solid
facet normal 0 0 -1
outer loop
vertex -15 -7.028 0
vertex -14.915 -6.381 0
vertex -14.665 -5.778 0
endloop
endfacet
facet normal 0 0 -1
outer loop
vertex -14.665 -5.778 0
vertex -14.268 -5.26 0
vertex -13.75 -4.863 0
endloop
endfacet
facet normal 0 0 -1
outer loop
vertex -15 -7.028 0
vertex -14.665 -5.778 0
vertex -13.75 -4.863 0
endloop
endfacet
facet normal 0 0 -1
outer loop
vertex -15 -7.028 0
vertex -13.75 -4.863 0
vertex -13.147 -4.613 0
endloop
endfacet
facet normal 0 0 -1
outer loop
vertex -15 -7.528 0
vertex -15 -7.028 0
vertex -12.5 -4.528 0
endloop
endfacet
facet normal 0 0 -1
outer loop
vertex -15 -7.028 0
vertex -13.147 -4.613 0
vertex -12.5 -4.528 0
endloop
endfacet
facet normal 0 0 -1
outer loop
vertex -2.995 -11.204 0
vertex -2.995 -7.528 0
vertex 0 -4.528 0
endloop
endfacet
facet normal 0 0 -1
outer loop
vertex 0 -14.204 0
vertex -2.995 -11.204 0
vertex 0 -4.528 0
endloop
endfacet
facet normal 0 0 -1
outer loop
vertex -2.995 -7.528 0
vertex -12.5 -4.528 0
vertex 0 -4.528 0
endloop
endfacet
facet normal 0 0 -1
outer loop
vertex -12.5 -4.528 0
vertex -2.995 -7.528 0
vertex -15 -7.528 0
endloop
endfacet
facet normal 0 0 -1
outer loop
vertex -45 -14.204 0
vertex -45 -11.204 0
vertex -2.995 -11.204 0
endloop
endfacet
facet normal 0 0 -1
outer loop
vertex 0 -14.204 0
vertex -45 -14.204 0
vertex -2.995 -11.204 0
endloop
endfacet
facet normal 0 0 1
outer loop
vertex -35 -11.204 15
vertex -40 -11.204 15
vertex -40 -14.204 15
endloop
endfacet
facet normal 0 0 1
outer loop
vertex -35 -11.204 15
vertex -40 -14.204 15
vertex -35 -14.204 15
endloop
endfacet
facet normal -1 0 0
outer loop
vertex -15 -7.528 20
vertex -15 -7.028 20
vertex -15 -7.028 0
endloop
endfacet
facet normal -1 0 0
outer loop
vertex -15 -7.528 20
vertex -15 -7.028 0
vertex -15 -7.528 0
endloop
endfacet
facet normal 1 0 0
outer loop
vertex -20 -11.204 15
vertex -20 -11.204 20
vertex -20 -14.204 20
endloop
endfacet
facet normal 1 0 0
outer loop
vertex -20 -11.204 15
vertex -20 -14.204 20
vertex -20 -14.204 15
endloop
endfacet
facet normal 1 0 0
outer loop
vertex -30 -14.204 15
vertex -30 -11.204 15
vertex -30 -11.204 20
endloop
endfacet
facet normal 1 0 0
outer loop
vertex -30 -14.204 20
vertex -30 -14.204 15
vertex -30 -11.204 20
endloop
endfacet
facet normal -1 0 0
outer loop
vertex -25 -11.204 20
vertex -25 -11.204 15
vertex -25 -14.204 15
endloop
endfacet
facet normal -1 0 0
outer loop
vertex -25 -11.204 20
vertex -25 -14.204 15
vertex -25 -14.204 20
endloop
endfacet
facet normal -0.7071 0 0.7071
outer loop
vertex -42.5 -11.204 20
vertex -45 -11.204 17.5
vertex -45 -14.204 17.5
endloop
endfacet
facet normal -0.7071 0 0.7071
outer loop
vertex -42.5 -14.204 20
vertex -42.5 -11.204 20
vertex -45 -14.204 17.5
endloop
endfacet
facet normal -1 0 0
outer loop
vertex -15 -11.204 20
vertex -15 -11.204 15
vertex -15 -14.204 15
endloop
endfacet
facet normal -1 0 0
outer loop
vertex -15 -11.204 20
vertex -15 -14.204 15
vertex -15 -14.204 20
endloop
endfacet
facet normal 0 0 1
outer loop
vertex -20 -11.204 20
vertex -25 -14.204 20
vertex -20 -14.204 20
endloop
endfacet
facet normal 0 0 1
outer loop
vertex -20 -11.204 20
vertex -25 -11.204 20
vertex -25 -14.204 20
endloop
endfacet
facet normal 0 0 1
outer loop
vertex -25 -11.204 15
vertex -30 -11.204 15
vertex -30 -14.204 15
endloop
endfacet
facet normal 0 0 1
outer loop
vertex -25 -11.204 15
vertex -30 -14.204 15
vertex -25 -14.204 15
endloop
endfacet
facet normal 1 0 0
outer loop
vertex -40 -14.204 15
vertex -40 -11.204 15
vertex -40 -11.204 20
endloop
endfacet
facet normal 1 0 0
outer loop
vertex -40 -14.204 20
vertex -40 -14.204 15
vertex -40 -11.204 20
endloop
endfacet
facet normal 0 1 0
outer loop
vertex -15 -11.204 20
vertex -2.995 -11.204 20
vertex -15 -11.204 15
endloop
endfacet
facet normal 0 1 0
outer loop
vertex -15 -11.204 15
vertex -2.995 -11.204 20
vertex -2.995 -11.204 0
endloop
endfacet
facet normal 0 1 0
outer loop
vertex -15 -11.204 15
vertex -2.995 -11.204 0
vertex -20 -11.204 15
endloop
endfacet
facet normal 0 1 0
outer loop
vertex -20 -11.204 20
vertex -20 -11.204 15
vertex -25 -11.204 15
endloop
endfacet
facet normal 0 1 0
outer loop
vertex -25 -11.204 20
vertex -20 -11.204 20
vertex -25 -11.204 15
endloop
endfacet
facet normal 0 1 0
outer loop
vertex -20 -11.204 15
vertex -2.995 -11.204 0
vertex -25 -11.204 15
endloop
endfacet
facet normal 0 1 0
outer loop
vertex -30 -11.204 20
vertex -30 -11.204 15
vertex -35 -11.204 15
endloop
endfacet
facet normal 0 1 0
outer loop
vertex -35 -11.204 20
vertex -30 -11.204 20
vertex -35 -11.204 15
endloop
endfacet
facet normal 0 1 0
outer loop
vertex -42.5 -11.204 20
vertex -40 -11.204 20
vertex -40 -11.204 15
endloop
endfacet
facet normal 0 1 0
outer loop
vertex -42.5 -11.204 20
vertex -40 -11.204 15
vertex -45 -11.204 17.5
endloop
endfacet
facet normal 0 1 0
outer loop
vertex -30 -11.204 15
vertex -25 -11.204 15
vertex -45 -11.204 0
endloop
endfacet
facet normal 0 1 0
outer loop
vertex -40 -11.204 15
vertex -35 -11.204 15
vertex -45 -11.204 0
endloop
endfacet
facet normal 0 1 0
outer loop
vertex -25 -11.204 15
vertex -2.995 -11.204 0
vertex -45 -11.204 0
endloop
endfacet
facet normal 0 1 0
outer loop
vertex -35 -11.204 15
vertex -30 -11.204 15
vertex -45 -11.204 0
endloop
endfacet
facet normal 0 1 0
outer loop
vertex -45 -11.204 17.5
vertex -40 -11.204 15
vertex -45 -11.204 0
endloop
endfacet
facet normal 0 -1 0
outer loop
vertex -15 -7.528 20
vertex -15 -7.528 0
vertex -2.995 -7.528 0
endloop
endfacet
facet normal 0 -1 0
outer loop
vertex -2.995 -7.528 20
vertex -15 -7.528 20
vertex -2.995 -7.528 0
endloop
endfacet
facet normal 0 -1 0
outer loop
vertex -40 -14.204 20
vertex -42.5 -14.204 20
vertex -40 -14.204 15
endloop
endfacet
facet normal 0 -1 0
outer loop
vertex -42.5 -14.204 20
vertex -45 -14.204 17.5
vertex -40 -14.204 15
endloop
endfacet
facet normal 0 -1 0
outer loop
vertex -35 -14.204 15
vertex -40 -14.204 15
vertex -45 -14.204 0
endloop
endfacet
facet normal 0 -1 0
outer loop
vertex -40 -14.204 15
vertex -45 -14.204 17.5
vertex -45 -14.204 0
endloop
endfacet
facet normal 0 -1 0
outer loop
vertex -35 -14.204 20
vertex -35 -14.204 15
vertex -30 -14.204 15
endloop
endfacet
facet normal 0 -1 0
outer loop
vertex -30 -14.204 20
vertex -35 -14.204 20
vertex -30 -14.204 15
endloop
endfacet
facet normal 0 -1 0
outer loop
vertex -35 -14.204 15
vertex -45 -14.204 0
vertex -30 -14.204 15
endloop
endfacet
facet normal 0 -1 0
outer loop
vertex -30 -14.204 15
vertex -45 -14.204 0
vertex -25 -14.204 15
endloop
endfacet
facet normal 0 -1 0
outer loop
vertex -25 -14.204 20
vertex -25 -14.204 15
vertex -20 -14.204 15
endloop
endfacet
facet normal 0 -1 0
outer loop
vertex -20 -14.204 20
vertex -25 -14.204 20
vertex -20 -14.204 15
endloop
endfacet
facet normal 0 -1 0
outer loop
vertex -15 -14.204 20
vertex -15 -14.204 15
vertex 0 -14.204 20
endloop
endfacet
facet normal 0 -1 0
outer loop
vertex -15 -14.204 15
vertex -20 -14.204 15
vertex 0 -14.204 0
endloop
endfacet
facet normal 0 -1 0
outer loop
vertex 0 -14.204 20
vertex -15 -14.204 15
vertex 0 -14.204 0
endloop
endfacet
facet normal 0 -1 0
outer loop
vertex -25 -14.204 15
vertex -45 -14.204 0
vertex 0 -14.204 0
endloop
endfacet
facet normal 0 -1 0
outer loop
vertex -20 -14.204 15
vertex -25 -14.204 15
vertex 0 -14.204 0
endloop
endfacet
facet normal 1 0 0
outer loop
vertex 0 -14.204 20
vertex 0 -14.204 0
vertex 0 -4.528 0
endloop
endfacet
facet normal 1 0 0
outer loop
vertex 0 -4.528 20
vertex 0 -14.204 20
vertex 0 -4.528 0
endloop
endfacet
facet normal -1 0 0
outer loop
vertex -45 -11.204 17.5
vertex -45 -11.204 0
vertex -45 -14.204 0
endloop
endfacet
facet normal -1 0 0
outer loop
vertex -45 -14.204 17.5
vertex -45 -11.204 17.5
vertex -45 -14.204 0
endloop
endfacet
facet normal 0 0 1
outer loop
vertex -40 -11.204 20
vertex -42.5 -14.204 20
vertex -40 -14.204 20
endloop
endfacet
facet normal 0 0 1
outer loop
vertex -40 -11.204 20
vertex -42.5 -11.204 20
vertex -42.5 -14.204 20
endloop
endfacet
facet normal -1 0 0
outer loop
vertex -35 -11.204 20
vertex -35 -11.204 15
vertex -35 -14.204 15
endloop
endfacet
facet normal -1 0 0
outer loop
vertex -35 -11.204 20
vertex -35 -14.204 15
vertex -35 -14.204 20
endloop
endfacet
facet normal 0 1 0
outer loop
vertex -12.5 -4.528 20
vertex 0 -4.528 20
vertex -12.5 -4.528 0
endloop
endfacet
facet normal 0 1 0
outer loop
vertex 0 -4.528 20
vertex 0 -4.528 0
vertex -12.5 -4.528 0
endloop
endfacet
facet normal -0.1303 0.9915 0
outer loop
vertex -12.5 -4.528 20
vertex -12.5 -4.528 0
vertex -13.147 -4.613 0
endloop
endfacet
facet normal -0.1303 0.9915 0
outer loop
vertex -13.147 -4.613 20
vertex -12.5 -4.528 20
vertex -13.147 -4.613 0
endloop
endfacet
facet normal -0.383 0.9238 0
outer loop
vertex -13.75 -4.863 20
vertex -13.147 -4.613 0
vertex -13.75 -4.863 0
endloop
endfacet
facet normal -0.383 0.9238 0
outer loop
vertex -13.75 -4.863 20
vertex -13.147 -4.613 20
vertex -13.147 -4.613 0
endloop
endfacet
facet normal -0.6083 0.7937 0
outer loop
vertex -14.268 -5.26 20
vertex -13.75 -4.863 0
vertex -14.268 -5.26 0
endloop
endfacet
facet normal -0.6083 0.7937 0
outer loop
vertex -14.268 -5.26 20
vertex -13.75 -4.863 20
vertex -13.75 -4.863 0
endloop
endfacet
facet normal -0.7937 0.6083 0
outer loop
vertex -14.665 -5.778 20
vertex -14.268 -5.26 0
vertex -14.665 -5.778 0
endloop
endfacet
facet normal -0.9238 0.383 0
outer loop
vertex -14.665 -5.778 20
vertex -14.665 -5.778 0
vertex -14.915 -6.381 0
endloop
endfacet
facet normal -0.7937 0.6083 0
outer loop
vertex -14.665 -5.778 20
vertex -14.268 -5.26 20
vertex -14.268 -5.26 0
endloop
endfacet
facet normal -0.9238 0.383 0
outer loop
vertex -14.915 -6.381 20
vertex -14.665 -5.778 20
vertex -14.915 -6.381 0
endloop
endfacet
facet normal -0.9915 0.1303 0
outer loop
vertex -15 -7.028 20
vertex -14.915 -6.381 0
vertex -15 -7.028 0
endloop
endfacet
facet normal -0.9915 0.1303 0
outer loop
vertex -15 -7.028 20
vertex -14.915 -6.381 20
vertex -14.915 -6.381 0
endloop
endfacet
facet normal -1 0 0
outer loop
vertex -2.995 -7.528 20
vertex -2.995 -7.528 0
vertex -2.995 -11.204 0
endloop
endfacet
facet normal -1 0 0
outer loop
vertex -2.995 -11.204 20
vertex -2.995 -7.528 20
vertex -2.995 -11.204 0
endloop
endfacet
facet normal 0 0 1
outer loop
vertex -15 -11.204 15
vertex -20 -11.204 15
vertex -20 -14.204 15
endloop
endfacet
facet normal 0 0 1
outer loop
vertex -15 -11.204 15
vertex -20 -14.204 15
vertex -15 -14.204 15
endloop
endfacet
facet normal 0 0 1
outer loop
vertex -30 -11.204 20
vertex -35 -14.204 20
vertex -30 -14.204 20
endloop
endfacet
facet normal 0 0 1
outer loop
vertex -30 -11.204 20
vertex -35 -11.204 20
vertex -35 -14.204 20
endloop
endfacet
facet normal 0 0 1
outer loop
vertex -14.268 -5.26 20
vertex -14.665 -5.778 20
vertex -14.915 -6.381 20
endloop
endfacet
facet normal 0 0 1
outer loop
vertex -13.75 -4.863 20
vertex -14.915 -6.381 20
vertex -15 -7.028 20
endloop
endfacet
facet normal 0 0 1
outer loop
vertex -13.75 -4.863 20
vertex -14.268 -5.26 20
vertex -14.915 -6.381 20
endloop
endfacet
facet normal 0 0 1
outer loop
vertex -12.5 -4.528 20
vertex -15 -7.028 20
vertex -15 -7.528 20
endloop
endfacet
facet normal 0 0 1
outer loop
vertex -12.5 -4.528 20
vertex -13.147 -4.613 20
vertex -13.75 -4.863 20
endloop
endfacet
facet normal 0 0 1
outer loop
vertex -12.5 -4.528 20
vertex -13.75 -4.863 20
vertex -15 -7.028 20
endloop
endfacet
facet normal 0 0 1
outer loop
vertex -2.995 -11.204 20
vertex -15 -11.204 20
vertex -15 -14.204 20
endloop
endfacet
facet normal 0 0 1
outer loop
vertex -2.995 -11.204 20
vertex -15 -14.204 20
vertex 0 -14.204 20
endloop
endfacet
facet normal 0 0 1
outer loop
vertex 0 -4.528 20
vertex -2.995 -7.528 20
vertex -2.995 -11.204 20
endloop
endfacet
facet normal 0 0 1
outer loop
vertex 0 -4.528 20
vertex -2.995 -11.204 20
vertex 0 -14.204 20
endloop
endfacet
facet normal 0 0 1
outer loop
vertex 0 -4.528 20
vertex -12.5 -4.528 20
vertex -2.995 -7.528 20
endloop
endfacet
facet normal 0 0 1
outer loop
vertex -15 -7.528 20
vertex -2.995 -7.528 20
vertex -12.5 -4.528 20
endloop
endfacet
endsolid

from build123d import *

# Parameters (mm, degrees)
F1_DEPTH = 20
F2_W     = 5
F2_H     = 5
F3_DEPTH = 14.204988947
F4_SIZE  = 2.5
F5_R     = 2.5


# Not quite as in the source:
# - a feature names something its author has since deleted; it is built from what else it names


with BuildPart() as f1:
    # F0 (on Top) → F1 (new body)
    with BuildSketch(Plane.XY):
        Polygon((0, -14.203988947), (0, -4.5276075453), (-15, -4.5276075453), (-15, -7.5276075453), (-2.9953992926, -7.5276075453), (-2.9953992926, -11.203988947), (-45, -11.203988947), (-45, -14.203988947), align=None)
    extrude(amount=F1_DEPTH)

    # F2 (on Front) → F3 (cut, through all)
    with BuildSketch(Plane.XZ):
        Polygon((-15, 17.4460405111), (-15, 20), (-20, 20), (-20, 15), (-15, 15), align=None)
        with Locations((-27.5, 17.5)):
            Rectangle(F2_W, F2_H)
        with Locations((-37.5, 17.5)):
            Rectangle(F2_W, F2_H)
    extrude(amount=F3_DEPTH, mode=Mode.SUBTRACT)

    # F4
    f4_edges = [f1.edges().sort_by_distance(p)[0] for p in [
        (-45, -12.703989, 20),
    ]]
    chamfer(f4_edges, length=F4_SIZE)

    # F5
    f5_edges = [f1.edges().sort_by_distance(p)[0] for p in [
        (-15, -4.527608, 10),
    ]]
    fillet(f5_edges, radius=F5_R)


solid = f1.part
